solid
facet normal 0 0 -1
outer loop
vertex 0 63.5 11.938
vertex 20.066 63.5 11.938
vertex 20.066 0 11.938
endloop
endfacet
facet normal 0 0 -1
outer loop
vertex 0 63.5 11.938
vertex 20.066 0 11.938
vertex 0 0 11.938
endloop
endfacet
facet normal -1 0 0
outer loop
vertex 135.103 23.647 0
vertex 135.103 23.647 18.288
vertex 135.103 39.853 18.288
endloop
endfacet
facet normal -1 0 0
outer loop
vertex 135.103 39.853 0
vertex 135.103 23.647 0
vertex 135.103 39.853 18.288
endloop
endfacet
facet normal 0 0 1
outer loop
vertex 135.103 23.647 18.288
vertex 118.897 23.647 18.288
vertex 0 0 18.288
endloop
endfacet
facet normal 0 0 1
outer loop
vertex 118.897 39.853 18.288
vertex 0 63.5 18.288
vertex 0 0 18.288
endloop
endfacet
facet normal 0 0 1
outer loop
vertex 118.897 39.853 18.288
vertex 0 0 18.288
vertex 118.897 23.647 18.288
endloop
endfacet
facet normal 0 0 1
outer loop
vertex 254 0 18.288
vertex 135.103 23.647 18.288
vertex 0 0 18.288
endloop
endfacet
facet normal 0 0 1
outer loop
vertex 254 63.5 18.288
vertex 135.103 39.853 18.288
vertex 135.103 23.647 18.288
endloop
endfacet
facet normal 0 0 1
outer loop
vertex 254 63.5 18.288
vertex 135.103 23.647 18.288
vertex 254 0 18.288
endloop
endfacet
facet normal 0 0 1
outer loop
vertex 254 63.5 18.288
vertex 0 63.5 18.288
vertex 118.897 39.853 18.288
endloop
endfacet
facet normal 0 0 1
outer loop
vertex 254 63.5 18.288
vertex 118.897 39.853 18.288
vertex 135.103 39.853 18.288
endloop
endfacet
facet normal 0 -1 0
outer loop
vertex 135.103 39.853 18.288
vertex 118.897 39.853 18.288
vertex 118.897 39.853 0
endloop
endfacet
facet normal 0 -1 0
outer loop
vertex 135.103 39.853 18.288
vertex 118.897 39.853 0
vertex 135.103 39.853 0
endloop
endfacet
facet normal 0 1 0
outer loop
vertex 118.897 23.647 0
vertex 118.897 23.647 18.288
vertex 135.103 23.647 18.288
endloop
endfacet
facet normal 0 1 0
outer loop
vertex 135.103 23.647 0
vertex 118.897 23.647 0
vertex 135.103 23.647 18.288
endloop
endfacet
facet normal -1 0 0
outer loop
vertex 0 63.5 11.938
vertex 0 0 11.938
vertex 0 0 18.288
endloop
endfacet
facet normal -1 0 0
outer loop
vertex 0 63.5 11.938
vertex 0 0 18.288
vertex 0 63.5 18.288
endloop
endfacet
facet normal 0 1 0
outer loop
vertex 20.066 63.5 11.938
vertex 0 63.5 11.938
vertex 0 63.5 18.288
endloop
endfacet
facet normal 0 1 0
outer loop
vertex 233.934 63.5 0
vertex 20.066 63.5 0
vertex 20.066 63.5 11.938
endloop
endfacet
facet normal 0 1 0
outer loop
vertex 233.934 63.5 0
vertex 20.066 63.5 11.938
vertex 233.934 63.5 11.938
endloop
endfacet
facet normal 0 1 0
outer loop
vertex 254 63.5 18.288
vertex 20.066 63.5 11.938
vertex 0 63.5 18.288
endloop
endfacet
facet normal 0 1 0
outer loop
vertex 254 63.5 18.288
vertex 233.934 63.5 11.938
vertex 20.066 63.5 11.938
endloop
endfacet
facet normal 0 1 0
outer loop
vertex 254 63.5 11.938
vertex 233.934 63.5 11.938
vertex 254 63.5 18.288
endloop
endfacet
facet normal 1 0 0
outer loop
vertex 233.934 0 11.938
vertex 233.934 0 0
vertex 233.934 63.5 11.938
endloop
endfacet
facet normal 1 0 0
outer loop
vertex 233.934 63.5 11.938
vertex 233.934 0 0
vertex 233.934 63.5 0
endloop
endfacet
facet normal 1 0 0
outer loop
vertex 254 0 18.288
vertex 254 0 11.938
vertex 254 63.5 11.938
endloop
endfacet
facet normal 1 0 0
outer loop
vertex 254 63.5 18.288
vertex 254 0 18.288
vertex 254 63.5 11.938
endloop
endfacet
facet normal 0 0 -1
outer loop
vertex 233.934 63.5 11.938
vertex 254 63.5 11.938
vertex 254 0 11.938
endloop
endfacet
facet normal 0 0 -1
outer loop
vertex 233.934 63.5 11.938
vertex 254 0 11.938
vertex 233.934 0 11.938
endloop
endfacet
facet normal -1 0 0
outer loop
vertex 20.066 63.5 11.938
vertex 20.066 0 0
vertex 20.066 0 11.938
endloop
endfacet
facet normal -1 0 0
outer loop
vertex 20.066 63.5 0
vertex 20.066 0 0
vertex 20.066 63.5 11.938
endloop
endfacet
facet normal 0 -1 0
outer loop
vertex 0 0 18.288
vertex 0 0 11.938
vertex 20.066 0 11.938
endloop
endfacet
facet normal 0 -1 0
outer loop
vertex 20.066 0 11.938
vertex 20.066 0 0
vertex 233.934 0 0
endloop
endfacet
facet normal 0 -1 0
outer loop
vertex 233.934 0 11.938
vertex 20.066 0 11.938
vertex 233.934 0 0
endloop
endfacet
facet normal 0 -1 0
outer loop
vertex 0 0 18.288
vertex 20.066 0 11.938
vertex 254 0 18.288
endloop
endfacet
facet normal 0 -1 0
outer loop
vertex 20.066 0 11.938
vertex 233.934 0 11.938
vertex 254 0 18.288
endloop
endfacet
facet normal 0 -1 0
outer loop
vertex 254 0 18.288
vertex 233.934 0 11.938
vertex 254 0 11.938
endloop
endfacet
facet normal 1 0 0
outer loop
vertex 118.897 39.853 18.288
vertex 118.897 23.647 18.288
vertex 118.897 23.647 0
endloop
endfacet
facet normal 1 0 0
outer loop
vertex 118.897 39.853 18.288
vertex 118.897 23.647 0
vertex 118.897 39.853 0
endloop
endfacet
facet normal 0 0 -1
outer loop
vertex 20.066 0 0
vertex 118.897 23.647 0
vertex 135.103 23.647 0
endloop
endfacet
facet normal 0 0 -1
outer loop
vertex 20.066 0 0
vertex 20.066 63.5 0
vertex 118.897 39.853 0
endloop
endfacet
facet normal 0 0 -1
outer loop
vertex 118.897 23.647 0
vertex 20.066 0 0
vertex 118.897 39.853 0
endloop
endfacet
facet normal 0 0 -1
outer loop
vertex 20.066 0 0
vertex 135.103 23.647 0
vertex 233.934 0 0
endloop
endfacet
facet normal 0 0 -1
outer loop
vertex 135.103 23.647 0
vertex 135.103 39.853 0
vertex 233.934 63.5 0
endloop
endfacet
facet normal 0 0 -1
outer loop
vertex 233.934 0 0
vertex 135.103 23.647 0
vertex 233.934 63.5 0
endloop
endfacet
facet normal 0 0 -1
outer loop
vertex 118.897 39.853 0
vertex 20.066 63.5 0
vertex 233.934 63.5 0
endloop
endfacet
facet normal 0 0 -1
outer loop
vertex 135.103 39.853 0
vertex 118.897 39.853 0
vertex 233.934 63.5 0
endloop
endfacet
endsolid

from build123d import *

# Parameters (mm, degrees)
SKETCH1_W           = 254
SKETCH1_H           = 63.5
BOSS_EXTRUDE1_DEPTH = 18.288
SKETCH2_W           = 16.2052
SKETCH2_H           = 16.2052
CUT_EXTRUDE1_DEPTH  = 263.455140822
SKETCH3_W           = 20.066
SKETCH3_H           = 63.5
CUT_EXTRUDE2_DEPTH  = 11.938


with BuildPart() as part:
    # Sketch1 → Boss-Extrude1 (new body)
    with BuildSketch(Plane.XY):
        with Locations((127, 31.75)):
            Rectangle(SKETCH1_W, SKETCH1_H)
    extrude(amount=BOSS_EXTRUDE1_DEPTH)

    # Sketch2 → Cut-Extrude1 (cut, through all)
    with BuildSketch(Plane.XY.offset(18.288)):
        with Locations((127, 31.75)):
            Rectangle(SKETCH2_W, SKETCH2_H)
    extrude(amount=-CUT_EXTRUDE1_DEPTH, mode=Mode.SUBTRACT)

    # Sketch3 → Cut-Extrude2 (cut)
    with BuildSketch(Plane(origin=(0, 0, 0), x_dir=(-1, 0, 0), z_dir=(0, 0, -1))):
        with Locations((-243.967, 31.75)):
            Rectangle(SKETCH3_W, SKETCH3_H)
        with Locations((-10.033, 31.75)):
            Rectangle(SKETCH3_W, SKETCH3_H)
    extrude(amount=-CUT_EXTRUDE2_DEPTH, mode=Mode.SUBTRACT)


solid = part.part
